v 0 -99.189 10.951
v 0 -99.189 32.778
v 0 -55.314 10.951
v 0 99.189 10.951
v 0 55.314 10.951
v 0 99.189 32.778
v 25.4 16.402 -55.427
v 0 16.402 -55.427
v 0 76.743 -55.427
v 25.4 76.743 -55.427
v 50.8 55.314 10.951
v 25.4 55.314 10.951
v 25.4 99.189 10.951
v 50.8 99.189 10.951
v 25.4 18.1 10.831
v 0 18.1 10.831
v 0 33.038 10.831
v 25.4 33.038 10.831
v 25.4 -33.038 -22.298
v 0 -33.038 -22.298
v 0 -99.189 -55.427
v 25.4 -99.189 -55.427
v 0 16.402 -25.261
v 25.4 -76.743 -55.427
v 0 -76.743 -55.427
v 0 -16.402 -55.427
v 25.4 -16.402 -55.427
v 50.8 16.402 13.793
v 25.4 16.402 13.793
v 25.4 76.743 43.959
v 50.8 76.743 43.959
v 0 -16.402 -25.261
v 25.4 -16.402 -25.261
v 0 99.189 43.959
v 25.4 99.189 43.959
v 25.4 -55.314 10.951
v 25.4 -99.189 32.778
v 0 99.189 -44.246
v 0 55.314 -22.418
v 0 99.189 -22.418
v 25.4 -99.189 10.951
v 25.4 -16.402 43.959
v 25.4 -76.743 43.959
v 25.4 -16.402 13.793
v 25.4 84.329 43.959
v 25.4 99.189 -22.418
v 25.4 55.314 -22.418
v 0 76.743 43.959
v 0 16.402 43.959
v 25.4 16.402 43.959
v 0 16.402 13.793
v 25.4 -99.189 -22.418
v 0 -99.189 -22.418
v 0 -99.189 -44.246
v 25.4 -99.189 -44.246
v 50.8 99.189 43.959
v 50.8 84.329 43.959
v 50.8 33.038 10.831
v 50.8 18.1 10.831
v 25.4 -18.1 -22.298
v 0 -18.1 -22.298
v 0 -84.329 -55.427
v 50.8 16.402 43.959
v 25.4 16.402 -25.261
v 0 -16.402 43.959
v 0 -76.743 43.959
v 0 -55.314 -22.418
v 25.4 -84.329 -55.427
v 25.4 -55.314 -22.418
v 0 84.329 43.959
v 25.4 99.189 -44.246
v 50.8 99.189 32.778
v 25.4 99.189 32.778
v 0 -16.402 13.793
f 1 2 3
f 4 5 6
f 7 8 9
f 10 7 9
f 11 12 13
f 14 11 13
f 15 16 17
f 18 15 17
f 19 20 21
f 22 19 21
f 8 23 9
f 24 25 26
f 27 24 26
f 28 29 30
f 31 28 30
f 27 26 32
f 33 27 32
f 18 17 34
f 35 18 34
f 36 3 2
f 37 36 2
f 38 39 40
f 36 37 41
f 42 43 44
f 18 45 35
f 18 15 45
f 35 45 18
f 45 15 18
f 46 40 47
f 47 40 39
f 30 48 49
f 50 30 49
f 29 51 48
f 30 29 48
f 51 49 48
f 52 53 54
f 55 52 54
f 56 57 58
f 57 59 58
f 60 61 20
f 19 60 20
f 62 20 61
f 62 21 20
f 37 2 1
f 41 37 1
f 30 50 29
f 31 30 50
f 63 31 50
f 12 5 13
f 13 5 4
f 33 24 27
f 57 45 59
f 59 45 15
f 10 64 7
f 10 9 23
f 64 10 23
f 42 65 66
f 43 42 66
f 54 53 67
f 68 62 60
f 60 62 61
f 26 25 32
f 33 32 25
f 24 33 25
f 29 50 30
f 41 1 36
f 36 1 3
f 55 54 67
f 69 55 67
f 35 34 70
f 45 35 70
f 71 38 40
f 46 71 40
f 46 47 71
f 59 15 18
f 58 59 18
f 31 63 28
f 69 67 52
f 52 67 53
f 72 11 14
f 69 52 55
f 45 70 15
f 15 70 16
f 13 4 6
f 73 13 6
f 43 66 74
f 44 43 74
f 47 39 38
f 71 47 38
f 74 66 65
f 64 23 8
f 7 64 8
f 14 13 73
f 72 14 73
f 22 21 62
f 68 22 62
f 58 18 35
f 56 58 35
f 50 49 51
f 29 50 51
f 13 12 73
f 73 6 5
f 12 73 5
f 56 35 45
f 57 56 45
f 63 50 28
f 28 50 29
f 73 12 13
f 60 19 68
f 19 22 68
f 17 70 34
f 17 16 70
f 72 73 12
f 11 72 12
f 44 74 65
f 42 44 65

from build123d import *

# Parameters (mm, degrees)
F1_DEPTH = 25.4
F2_DEPTH = 25.4
F3_DEPTH = 25.4
F4_DEPTH = 25.4


with BuildPart() as f1:
    # F0 (on Right) → F1 (new body)
    with BuildSketch(Plane.YZ):
        Polygon((99.188678, 32.778401), (55.31371, 10.950533), (99.188678, 10.950533), align=None)
    extrude(amount=F1_DEPTH)


with BuildPart() as f2:
    # F0 (on Right) → F2 (new body)
    with BuildSketch(Plane.YZ):
        Polygon((18.099664, 10.830818), (33.037685, 10.830818), (99.188678, 43.959372), (84.329478, 43.959372), align=None)
    extrude(amount=F2_DEPTH)


with BuildPart() as f3:
    # F0 (on Right) → F3 (new body)
    with BuildSketch(Plane.YZ):
        Polygon((16.402107, 43.959372), (16.402107, 13.792999), (76.742783, 43.959372), align=None)
    extrude(amount=F3_DEPTH)


with BuildPart() as f4:
    # F0 (on Right) + F1_face (on face) + F3_face (on face) + F2_face (on face) → F4 (new body)
    with BuildSketch(Plane.YZ):
        Polygon((-76.742783, -55.427026), (-16.402107, -55.427026), (-16.402107, -25.260653), align=None)
        Polygon((-99.188678, -55.427026), (-84.329478, -55.427026), (-18.099664, -22.298472), (-33.037685, -22.298472), align=None)
        Polygon((-99.188678, -44.246055), (-55.31371, -22.418187), (-99.188678, -22.418187), align=None)
        Polygon((76.742783, -55.427026), (16.402107, -25.260653), (16.402107, -55.427026), align=None)
        Polygon((55.31371, -22.418187), (99.188678, -44.246055), (99.188678, -22.418187), align=None)
        Polygon((-16.402107, 13.792999), (-16.402107, 43.959372), (-76.742783, 43.959372), align=None)
        Polygon((-55.31371, 10.950533), (-99.188678, 32.778401), (-99.188678, 10.950533), align=None)
    with BuildSketch(Plane(origin=(25.4, 84.563689, 18.226489), x_dir=(0, 1, 0), z_dir=(1, 0, 0))):
        Polygon((14.624989, 14.551912), (-29.249979, -7.275956), (14.624989, -7.275956), align=None)
    with BuildSketch(Plane(origin=(25.4, 36.515666, 33.903914), x_dir=(0, 1, 0), z_dir=(1, 0, 0))):
        Polygon((-20.113559, 10.055458), (-20.113559, -20.110915), (40.227118, 10.055458), align=None)
    with BuildSketch(Plane(origin=(25.4, 58.634694, 27.380489), x_dir=(0, 1, 0), z_dir=(1, 0, 0))):
        Polygon((-40.535031, -16.549671), (-25.59701, -16.549671), (40.553984, 16.578883), (25.694784, 16.578883), align=None)
    extrude(amount=F4_DEPTH)


solid = Compound([f1.part, f2.part, f3.part, f4.part])
